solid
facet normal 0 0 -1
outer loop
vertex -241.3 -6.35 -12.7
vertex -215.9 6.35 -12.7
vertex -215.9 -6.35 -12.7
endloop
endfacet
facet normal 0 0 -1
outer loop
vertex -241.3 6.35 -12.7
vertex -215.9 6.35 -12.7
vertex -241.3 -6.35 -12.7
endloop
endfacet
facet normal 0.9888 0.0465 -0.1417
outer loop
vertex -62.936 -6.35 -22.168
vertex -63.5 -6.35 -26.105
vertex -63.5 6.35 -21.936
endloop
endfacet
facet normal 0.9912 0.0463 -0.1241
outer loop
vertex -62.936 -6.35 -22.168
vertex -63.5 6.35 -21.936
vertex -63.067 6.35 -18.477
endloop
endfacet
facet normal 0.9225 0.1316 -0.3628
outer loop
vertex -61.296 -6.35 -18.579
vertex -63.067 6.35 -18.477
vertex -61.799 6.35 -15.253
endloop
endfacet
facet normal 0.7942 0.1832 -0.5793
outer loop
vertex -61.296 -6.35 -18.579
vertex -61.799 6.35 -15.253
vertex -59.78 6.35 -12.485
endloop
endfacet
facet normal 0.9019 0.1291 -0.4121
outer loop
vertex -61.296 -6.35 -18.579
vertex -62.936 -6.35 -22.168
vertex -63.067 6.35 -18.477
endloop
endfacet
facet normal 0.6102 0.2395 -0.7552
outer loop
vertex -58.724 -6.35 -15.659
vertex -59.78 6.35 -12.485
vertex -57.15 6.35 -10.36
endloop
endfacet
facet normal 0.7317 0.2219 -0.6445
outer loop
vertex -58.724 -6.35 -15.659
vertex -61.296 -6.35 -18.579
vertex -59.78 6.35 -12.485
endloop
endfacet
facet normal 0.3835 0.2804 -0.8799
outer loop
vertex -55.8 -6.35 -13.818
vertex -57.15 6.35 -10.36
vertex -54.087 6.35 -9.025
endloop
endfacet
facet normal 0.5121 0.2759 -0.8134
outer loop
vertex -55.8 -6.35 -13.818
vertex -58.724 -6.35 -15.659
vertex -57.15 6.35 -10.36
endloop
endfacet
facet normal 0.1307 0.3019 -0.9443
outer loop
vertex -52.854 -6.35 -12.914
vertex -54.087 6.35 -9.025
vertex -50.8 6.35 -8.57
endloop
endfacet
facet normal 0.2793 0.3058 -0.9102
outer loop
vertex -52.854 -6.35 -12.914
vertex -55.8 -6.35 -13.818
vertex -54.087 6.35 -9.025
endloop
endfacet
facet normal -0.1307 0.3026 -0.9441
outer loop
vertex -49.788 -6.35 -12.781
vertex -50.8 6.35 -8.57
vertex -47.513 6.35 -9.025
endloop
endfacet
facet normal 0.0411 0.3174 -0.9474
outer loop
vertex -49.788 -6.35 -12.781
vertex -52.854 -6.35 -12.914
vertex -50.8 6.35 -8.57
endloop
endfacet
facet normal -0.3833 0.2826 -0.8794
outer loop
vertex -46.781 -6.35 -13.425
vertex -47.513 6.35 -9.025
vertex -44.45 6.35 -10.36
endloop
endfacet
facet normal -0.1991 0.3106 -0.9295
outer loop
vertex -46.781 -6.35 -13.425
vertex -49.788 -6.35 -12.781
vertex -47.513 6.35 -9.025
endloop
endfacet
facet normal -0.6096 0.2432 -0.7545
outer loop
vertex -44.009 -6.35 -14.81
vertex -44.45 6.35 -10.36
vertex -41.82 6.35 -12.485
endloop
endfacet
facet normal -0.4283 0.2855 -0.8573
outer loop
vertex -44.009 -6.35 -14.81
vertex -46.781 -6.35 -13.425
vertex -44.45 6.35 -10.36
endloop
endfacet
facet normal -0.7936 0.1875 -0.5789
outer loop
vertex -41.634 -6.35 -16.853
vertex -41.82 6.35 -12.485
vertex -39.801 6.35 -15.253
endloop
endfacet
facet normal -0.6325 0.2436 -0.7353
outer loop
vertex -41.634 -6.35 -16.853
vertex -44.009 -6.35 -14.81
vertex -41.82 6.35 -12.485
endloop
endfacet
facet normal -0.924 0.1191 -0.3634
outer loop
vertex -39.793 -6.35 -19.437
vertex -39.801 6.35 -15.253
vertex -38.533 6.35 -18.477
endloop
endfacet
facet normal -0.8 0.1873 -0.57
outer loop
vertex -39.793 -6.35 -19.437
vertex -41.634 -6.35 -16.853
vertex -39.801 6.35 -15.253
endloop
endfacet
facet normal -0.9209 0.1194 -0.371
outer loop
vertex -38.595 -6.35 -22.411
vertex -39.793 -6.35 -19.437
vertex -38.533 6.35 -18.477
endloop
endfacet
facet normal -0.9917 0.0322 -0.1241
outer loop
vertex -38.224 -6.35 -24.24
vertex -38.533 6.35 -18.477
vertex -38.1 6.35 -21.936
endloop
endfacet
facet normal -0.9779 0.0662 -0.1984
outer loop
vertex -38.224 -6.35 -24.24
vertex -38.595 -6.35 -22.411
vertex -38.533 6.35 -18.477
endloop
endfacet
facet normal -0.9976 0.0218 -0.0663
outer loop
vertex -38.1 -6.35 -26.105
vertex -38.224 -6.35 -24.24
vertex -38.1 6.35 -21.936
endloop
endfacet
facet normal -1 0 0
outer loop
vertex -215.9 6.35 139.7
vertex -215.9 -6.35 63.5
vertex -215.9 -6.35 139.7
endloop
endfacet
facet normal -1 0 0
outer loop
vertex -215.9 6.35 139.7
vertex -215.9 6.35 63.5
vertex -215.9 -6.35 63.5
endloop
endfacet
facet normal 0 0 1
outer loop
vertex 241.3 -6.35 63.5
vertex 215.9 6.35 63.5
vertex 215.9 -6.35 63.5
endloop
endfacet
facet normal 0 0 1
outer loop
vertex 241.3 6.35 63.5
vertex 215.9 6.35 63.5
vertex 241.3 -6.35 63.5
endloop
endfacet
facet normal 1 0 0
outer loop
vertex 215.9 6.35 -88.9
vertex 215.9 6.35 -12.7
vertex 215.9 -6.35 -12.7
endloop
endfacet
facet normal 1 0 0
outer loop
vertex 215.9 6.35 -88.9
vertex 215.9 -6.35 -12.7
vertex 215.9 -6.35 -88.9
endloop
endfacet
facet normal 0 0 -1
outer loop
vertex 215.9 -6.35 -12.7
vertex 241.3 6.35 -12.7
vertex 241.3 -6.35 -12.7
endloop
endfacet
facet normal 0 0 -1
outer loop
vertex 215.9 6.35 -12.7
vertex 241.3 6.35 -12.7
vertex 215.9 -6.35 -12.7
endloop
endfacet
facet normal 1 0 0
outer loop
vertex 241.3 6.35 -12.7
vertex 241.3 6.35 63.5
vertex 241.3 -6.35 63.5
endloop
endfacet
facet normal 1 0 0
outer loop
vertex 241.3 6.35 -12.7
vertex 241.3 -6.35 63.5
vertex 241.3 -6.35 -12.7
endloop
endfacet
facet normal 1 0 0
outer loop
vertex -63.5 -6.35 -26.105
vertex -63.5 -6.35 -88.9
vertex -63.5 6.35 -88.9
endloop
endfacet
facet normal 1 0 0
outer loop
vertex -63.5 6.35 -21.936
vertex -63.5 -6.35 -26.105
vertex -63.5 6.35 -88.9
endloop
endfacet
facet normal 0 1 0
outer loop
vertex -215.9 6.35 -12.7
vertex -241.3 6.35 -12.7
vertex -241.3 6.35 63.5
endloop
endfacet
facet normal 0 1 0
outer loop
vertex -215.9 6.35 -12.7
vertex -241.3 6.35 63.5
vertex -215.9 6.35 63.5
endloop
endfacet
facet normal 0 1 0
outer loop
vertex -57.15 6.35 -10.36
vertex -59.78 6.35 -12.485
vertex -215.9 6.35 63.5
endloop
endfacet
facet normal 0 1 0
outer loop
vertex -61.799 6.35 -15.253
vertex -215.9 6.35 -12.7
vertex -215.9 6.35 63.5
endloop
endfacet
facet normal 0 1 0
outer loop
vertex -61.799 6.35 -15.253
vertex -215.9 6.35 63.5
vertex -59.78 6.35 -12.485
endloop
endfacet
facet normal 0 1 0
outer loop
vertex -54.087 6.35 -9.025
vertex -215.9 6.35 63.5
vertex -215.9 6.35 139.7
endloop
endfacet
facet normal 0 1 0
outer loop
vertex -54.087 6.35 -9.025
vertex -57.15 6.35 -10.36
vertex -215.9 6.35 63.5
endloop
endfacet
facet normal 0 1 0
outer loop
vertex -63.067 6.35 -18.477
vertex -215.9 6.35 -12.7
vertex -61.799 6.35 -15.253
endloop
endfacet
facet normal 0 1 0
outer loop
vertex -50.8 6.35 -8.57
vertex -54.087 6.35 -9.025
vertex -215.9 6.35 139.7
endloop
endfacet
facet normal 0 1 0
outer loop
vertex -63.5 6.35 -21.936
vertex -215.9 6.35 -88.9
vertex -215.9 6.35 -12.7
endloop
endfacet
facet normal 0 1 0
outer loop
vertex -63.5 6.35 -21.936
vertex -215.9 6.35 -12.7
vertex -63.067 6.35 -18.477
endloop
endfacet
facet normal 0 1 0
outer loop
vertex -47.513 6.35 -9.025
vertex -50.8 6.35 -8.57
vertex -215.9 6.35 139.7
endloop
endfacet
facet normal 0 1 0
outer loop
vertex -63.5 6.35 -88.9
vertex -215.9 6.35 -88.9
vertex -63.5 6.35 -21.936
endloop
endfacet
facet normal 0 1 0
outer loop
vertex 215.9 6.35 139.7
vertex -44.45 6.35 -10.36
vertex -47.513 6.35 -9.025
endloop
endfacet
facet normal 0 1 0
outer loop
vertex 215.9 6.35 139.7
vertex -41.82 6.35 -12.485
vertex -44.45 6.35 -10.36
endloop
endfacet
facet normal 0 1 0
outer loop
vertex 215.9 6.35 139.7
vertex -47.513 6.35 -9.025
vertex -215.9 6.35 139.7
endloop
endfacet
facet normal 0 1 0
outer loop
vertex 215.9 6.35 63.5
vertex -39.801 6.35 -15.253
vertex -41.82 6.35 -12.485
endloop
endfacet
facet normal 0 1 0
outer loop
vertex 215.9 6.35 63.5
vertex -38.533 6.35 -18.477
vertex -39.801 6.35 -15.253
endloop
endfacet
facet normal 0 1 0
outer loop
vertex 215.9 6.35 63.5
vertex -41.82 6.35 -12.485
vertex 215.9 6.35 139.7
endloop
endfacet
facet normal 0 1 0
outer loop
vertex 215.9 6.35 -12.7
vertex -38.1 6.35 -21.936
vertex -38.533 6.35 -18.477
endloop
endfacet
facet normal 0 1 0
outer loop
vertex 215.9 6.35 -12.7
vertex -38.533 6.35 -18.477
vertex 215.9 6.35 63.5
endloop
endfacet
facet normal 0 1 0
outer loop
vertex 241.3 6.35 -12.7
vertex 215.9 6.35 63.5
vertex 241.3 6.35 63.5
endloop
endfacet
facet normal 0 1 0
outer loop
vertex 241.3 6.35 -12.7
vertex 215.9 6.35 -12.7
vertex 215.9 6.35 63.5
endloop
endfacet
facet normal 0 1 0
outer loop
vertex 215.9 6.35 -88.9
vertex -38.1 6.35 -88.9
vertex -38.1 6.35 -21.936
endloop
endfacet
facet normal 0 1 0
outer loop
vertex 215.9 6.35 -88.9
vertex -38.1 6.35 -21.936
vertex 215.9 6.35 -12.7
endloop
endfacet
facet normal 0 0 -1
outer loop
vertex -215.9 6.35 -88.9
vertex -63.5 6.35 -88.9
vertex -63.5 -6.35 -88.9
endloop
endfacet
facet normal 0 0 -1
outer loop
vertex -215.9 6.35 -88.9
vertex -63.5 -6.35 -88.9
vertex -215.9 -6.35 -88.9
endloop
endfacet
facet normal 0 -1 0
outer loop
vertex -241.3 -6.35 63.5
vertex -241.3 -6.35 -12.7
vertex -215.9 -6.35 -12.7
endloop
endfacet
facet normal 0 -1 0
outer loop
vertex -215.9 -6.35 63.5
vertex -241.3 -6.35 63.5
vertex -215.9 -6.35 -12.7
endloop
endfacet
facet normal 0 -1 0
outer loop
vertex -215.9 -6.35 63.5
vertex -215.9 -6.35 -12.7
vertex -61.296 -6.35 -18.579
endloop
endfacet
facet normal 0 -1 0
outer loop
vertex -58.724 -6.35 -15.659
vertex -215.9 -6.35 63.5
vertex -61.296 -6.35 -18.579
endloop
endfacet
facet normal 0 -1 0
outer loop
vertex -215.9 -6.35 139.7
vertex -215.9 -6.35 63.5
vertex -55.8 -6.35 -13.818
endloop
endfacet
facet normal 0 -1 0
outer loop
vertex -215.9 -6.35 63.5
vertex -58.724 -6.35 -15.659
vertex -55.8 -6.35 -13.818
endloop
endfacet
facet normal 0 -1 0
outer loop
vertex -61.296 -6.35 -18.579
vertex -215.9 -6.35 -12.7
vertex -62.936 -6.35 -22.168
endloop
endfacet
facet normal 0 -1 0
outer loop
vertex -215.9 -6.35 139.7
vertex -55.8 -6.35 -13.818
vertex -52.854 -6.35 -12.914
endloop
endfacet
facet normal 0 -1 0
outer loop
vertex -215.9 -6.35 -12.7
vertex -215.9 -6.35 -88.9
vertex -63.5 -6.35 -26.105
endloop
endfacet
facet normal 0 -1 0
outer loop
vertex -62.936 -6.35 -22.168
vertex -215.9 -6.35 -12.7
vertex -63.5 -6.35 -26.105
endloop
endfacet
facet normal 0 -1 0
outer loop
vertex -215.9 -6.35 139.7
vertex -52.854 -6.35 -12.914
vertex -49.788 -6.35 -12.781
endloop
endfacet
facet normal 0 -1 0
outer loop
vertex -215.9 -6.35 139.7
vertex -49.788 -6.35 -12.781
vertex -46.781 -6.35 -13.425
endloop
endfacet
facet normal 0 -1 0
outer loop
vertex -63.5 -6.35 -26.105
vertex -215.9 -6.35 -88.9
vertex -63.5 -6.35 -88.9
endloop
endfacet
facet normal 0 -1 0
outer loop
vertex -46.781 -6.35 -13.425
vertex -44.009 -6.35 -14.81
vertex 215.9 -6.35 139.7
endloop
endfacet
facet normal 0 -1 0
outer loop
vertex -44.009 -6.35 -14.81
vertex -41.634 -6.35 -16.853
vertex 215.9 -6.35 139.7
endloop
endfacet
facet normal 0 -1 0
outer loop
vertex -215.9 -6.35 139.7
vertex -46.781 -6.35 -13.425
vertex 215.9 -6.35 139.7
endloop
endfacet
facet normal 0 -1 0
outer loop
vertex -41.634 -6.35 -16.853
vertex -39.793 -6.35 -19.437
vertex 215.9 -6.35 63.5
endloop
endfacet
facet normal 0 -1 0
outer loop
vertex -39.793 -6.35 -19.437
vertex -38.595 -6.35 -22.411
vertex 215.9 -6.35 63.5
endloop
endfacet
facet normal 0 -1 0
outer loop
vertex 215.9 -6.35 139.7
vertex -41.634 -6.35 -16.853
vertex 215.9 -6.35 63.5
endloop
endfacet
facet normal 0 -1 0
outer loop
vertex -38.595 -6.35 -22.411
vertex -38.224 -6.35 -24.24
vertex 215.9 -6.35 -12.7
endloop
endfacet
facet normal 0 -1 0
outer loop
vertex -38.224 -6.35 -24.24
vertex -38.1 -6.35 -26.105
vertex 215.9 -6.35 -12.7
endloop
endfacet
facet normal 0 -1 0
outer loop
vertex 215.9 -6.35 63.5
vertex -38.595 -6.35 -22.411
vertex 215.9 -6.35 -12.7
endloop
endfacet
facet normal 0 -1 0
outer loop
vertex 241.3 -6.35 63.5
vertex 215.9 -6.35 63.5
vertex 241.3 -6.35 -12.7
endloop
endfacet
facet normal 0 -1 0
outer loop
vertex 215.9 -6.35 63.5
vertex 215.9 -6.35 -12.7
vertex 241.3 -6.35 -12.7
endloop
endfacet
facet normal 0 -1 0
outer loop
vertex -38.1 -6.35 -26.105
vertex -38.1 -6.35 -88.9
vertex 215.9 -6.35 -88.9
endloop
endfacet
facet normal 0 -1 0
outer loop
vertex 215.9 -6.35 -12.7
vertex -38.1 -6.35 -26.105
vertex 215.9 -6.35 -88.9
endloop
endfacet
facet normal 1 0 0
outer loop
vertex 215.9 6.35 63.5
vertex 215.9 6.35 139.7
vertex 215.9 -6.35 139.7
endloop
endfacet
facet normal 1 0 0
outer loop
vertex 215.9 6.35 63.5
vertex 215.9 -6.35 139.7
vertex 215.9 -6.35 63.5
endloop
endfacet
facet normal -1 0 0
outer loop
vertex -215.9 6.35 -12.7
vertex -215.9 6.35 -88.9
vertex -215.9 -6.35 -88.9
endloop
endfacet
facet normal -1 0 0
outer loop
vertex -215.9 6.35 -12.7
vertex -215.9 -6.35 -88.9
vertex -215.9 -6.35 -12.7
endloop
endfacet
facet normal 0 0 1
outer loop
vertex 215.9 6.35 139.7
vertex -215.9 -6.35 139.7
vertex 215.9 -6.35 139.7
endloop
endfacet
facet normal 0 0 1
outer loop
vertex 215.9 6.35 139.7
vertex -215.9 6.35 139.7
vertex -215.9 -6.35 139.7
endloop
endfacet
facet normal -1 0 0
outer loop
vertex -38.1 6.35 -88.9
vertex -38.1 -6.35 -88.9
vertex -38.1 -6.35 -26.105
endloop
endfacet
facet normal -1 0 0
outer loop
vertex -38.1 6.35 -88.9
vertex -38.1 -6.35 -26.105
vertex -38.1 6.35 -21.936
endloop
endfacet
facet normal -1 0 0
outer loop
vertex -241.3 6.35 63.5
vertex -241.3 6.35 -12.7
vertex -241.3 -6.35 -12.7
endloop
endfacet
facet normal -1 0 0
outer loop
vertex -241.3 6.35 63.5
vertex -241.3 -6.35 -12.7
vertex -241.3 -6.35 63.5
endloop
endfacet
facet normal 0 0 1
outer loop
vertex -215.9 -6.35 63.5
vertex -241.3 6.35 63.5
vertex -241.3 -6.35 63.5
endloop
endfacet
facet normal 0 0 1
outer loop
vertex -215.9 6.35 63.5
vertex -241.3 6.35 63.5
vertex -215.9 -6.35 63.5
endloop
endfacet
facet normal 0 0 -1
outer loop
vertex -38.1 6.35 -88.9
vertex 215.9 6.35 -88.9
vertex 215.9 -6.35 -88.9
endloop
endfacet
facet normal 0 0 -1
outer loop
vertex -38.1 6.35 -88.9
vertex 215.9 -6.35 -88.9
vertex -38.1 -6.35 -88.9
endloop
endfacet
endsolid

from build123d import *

# Parameters (mm, degrees)
BOSS_EXTRUDE1_DEPTH     = 6.35
CAVITY1_START           = -18.343561252
CAVITY1_OUTLINE_R       = 12.7
CAVITY1_DEPTH           = 21.704189785
CUT_EXTRUDE1_REACH      = 334.451
CUT_EXTRUDE1_END_RADIUS = 12.7
SKETCH3_W               = 25.4
SKETCH3_H               = 12.7


# Read off the part's stored shape, not the designer's step: Cavity1
with BuildPart() as part:
    # Sketch1 → Boss-Extrude1 (new, symmetric)
    with BuildSketch(Plane(origin=(0, 0, 0), x_dir=(1, 0, 0), z_dir=(0, 1, 0))):
        Polygon((-215.9, -139.7), (215.9, -139.7), (215.9, -63.5), (241.3, -63.5), (241.3, 12.7), (215.9, 12.7), (215.9, 88.9), (-215.9, 88.9), (-215.9, 12.7), (-241.3, 12.7), (-241.3, -63.5), (-215.9, -63.5), align=None)
    extrude(amount=BOSS_EXTRUDE1_DEPTH, both=True)

    # Cavity1 outline → Cavity1 (cut)
    with BuildSketch(Plane(origin=(0, 0, 0), x_dir=(1, 0, 0), z_dir=(0, 0.9501228611580823, 0.3118758546357501)).offset(CAVITY1_START)):
        with Locations((-50.8, 22.822585801)):
            Circle(CAVITY1_OUTLINE_R)
    extrude(amount=CAVITY1_DEPTH, mode=Mode.SUBTRACT)

    # Cut-Extrude1: up to this cylinder (the profile starts outside it)
    cut_extrude1_end = Plane(origin=(-50.8, -19.225068271, -30.3312567), z_dir=(0, 0.9501228611580824, 0.3118758546357496)) * Cylinder(CUT_EXTRUDE1_END_RADIUS, 695.302, mode=Mode.PRIVATE)
    # Sketch3 → Cut-Extrude1 (cut, up to the surface)
    with BuildSketch(Plane(origin=(0, 0, -88.9), x_dir=(-1, 0, 0), z_dir=(0, 0, -1)), mode=Mode.PRIVATE) as cut_extrude1_sk1:
        with Locations((50.8, 0)):
            Rectangle(SKETCH3_W, SKETCH3_H)
    cut_extrude1_tool1 = extrude(cut_extrude1_sk1.sketch, amount=-CUT_EXTRUDE1_REACH, mode=Mode.PRIVATE) - cut_extrude1_end
    add(cut_extrude1_tool1.solids().sort_by_distance((-50.8, 0, -88.9))[0], mode=Mode.SUBTRACT)


solid = part.part
